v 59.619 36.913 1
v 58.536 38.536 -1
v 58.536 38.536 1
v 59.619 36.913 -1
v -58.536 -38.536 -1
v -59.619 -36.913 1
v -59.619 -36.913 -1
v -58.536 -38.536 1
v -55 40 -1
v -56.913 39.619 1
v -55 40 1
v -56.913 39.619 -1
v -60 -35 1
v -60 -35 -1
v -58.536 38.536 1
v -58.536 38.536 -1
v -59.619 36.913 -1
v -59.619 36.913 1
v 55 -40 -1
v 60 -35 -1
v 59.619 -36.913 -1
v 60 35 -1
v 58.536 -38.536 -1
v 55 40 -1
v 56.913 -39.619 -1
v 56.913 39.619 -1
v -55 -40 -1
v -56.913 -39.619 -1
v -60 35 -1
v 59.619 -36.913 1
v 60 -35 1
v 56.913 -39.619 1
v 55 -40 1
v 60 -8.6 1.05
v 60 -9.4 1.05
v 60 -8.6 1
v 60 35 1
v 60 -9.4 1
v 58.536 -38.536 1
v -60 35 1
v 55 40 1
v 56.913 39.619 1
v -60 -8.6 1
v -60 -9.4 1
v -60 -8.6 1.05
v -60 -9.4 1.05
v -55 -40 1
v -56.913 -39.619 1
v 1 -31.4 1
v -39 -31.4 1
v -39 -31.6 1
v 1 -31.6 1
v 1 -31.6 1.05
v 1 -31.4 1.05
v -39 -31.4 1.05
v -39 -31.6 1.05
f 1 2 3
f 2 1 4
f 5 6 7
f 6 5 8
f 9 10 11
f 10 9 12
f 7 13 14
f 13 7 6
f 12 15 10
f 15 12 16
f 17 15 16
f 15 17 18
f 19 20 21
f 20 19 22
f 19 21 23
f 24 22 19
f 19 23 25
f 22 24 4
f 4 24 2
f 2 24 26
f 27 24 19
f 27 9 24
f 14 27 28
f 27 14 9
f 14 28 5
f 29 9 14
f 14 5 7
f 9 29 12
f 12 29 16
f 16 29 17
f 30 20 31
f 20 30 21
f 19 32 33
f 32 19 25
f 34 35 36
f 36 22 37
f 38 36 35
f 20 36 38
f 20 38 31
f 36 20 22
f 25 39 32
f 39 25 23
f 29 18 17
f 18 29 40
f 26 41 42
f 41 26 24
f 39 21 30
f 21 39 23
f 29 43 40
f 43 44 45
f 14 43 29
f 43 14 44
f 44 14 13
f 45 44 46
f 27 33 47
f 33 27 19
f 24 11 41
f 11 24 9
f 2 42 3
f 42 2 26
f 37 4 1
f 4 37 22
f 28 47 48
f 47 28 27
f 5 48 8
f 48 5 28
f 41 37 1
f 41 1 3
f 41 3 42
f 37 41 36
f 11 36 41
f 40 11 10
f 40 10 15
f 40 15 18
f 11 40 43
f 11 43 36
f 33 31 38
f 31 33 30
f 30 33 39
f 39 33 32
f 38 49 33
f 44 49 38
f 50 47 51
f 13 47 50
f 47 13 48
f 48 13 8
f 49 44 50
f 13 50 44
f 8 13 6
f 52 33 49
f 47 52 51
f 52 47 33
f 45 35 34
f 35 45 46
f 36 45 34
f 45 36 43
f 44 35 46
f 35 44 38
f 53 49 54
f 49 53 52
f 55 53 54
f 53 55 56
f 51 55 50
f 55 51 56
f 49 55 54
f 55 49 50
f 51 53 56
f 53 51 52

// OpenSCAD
// 设置字体
font = "Noto Sans SC:style=Black";

// 背景板参数
plate_width = 120;           // 背景板宽度
plate_height = 80;           // 背景板高度
plate_thickness = 2;         // 背景板厚度
corner_radius = 5;           // 圆角半径
base_z = 1;                  // 底板上方元素的Z轴位置

// 第一条横线参数
line1_y = -9;                 // 第一条横线Y轴位置 (-19 + 10)
line1_width = plate_width;   // 第一条横线宽度
line1_thickness = 0.8;       // 第一条横线粗细
line1_height = 0.1;         // 第一条横线高度

// 第二条横线参数
line2_x = -19;                // 第二条横线X轴位置
line2_y = -31.5;               // 第二条横线Y轴位置 (-41.5 + 10)
line2_width = 40;           // 第二条横线宽度
line2_thickness = 0.2;       // 第二条横线粗细
line2_height = 0.1;         // 第二条横线高度

// 文字参数设置
chinese_text_size = 5;        // 中文字体大小
chinese_text_x = -40;         // 中文X位置
chinese_text_y = -30;         // 中文Y位置 (-40 + 10)
english_text_size = 2;        // 英文字体大小
english_text_x = -39;         // 英文X位置
english_text_y = -34.5;         // 英文Y位置 (-44.5 + 10)
number_text_size = 12;        // 编号字体大小
number_text_x = 2;           // 编��X位置
number_text_y = -35;         // 编号Y位置 (-45 + 10)

// 圆形标志参数
logo_x = -50;                // 标志X位置
logo_y = -29;                 // 标志Y位置 (-39 + 10)
logo_radius = 6;             // 标志半径

// 创建圆角矩形
module rounded_rect(width, height, radius) {
    hull() {
        translate([(-width/2) + radius, (-height/2) + radius, 0]) 
        circle(r=radius);
        
        translate([(width/2) - radius, (-height/2) + radius, 0]) 
        circle(r=radius);
        
        translate([(-width/2) + radius, (height/2) - radius, 0]) 
        circle(r=radius);
        
        translate([(width/2) - radius, (height/2) - radius, 0]) 
        circle(r=radius);
    }
}

// 创建背景板
module background() {
    color([0, 0.2, 0.8]) // 更准确的蓝色
    linear_extrude(height = plate_thickness, center = true)
    rounded_rect(plate_width, plate_height, corner_radius);
}

// 创建横线
module horizontal_line1() {
    color("white")
    translate([0, line1_y, base_z])
    cube([line1_width, line1_thickness, line1_height], center = true);
}

// 创建第二条横线
module horizontal_line2() {
    color("white")
    translate([line2_x, line2_y, base_z])  // 使用line2_x参数
    cube([line2_width, line2_thickness, line2_height], center = true);
}

// 创建文字
module text_content() {
    // 标志
    translate([logo_x, logo_y, base_z])
    color("white")
    circle(r=logo_radius);
    
    // 中文名称
    color("white")
    translate([chinese_text_x, chinese_text_y, base_z])
    text("北科昊月学园", size = chinese_text_size, font = font);

    // 英文名称
    color("white")
    translate([english_text_x, english_text_y, base_z])
    text("BEIKE  HAOYUE  SCHOOL  PARK", size = english_text_size, font = font);

    // 编号
    color("white")
    translate([number_text_x, number_text_y, base_z])
    text("HD402", size = number_text_size, font = font, spacing = 1.1);
}

// 组合背景板和文字
background();
horizontal_line1();
horizontal_line2();
text_content();
